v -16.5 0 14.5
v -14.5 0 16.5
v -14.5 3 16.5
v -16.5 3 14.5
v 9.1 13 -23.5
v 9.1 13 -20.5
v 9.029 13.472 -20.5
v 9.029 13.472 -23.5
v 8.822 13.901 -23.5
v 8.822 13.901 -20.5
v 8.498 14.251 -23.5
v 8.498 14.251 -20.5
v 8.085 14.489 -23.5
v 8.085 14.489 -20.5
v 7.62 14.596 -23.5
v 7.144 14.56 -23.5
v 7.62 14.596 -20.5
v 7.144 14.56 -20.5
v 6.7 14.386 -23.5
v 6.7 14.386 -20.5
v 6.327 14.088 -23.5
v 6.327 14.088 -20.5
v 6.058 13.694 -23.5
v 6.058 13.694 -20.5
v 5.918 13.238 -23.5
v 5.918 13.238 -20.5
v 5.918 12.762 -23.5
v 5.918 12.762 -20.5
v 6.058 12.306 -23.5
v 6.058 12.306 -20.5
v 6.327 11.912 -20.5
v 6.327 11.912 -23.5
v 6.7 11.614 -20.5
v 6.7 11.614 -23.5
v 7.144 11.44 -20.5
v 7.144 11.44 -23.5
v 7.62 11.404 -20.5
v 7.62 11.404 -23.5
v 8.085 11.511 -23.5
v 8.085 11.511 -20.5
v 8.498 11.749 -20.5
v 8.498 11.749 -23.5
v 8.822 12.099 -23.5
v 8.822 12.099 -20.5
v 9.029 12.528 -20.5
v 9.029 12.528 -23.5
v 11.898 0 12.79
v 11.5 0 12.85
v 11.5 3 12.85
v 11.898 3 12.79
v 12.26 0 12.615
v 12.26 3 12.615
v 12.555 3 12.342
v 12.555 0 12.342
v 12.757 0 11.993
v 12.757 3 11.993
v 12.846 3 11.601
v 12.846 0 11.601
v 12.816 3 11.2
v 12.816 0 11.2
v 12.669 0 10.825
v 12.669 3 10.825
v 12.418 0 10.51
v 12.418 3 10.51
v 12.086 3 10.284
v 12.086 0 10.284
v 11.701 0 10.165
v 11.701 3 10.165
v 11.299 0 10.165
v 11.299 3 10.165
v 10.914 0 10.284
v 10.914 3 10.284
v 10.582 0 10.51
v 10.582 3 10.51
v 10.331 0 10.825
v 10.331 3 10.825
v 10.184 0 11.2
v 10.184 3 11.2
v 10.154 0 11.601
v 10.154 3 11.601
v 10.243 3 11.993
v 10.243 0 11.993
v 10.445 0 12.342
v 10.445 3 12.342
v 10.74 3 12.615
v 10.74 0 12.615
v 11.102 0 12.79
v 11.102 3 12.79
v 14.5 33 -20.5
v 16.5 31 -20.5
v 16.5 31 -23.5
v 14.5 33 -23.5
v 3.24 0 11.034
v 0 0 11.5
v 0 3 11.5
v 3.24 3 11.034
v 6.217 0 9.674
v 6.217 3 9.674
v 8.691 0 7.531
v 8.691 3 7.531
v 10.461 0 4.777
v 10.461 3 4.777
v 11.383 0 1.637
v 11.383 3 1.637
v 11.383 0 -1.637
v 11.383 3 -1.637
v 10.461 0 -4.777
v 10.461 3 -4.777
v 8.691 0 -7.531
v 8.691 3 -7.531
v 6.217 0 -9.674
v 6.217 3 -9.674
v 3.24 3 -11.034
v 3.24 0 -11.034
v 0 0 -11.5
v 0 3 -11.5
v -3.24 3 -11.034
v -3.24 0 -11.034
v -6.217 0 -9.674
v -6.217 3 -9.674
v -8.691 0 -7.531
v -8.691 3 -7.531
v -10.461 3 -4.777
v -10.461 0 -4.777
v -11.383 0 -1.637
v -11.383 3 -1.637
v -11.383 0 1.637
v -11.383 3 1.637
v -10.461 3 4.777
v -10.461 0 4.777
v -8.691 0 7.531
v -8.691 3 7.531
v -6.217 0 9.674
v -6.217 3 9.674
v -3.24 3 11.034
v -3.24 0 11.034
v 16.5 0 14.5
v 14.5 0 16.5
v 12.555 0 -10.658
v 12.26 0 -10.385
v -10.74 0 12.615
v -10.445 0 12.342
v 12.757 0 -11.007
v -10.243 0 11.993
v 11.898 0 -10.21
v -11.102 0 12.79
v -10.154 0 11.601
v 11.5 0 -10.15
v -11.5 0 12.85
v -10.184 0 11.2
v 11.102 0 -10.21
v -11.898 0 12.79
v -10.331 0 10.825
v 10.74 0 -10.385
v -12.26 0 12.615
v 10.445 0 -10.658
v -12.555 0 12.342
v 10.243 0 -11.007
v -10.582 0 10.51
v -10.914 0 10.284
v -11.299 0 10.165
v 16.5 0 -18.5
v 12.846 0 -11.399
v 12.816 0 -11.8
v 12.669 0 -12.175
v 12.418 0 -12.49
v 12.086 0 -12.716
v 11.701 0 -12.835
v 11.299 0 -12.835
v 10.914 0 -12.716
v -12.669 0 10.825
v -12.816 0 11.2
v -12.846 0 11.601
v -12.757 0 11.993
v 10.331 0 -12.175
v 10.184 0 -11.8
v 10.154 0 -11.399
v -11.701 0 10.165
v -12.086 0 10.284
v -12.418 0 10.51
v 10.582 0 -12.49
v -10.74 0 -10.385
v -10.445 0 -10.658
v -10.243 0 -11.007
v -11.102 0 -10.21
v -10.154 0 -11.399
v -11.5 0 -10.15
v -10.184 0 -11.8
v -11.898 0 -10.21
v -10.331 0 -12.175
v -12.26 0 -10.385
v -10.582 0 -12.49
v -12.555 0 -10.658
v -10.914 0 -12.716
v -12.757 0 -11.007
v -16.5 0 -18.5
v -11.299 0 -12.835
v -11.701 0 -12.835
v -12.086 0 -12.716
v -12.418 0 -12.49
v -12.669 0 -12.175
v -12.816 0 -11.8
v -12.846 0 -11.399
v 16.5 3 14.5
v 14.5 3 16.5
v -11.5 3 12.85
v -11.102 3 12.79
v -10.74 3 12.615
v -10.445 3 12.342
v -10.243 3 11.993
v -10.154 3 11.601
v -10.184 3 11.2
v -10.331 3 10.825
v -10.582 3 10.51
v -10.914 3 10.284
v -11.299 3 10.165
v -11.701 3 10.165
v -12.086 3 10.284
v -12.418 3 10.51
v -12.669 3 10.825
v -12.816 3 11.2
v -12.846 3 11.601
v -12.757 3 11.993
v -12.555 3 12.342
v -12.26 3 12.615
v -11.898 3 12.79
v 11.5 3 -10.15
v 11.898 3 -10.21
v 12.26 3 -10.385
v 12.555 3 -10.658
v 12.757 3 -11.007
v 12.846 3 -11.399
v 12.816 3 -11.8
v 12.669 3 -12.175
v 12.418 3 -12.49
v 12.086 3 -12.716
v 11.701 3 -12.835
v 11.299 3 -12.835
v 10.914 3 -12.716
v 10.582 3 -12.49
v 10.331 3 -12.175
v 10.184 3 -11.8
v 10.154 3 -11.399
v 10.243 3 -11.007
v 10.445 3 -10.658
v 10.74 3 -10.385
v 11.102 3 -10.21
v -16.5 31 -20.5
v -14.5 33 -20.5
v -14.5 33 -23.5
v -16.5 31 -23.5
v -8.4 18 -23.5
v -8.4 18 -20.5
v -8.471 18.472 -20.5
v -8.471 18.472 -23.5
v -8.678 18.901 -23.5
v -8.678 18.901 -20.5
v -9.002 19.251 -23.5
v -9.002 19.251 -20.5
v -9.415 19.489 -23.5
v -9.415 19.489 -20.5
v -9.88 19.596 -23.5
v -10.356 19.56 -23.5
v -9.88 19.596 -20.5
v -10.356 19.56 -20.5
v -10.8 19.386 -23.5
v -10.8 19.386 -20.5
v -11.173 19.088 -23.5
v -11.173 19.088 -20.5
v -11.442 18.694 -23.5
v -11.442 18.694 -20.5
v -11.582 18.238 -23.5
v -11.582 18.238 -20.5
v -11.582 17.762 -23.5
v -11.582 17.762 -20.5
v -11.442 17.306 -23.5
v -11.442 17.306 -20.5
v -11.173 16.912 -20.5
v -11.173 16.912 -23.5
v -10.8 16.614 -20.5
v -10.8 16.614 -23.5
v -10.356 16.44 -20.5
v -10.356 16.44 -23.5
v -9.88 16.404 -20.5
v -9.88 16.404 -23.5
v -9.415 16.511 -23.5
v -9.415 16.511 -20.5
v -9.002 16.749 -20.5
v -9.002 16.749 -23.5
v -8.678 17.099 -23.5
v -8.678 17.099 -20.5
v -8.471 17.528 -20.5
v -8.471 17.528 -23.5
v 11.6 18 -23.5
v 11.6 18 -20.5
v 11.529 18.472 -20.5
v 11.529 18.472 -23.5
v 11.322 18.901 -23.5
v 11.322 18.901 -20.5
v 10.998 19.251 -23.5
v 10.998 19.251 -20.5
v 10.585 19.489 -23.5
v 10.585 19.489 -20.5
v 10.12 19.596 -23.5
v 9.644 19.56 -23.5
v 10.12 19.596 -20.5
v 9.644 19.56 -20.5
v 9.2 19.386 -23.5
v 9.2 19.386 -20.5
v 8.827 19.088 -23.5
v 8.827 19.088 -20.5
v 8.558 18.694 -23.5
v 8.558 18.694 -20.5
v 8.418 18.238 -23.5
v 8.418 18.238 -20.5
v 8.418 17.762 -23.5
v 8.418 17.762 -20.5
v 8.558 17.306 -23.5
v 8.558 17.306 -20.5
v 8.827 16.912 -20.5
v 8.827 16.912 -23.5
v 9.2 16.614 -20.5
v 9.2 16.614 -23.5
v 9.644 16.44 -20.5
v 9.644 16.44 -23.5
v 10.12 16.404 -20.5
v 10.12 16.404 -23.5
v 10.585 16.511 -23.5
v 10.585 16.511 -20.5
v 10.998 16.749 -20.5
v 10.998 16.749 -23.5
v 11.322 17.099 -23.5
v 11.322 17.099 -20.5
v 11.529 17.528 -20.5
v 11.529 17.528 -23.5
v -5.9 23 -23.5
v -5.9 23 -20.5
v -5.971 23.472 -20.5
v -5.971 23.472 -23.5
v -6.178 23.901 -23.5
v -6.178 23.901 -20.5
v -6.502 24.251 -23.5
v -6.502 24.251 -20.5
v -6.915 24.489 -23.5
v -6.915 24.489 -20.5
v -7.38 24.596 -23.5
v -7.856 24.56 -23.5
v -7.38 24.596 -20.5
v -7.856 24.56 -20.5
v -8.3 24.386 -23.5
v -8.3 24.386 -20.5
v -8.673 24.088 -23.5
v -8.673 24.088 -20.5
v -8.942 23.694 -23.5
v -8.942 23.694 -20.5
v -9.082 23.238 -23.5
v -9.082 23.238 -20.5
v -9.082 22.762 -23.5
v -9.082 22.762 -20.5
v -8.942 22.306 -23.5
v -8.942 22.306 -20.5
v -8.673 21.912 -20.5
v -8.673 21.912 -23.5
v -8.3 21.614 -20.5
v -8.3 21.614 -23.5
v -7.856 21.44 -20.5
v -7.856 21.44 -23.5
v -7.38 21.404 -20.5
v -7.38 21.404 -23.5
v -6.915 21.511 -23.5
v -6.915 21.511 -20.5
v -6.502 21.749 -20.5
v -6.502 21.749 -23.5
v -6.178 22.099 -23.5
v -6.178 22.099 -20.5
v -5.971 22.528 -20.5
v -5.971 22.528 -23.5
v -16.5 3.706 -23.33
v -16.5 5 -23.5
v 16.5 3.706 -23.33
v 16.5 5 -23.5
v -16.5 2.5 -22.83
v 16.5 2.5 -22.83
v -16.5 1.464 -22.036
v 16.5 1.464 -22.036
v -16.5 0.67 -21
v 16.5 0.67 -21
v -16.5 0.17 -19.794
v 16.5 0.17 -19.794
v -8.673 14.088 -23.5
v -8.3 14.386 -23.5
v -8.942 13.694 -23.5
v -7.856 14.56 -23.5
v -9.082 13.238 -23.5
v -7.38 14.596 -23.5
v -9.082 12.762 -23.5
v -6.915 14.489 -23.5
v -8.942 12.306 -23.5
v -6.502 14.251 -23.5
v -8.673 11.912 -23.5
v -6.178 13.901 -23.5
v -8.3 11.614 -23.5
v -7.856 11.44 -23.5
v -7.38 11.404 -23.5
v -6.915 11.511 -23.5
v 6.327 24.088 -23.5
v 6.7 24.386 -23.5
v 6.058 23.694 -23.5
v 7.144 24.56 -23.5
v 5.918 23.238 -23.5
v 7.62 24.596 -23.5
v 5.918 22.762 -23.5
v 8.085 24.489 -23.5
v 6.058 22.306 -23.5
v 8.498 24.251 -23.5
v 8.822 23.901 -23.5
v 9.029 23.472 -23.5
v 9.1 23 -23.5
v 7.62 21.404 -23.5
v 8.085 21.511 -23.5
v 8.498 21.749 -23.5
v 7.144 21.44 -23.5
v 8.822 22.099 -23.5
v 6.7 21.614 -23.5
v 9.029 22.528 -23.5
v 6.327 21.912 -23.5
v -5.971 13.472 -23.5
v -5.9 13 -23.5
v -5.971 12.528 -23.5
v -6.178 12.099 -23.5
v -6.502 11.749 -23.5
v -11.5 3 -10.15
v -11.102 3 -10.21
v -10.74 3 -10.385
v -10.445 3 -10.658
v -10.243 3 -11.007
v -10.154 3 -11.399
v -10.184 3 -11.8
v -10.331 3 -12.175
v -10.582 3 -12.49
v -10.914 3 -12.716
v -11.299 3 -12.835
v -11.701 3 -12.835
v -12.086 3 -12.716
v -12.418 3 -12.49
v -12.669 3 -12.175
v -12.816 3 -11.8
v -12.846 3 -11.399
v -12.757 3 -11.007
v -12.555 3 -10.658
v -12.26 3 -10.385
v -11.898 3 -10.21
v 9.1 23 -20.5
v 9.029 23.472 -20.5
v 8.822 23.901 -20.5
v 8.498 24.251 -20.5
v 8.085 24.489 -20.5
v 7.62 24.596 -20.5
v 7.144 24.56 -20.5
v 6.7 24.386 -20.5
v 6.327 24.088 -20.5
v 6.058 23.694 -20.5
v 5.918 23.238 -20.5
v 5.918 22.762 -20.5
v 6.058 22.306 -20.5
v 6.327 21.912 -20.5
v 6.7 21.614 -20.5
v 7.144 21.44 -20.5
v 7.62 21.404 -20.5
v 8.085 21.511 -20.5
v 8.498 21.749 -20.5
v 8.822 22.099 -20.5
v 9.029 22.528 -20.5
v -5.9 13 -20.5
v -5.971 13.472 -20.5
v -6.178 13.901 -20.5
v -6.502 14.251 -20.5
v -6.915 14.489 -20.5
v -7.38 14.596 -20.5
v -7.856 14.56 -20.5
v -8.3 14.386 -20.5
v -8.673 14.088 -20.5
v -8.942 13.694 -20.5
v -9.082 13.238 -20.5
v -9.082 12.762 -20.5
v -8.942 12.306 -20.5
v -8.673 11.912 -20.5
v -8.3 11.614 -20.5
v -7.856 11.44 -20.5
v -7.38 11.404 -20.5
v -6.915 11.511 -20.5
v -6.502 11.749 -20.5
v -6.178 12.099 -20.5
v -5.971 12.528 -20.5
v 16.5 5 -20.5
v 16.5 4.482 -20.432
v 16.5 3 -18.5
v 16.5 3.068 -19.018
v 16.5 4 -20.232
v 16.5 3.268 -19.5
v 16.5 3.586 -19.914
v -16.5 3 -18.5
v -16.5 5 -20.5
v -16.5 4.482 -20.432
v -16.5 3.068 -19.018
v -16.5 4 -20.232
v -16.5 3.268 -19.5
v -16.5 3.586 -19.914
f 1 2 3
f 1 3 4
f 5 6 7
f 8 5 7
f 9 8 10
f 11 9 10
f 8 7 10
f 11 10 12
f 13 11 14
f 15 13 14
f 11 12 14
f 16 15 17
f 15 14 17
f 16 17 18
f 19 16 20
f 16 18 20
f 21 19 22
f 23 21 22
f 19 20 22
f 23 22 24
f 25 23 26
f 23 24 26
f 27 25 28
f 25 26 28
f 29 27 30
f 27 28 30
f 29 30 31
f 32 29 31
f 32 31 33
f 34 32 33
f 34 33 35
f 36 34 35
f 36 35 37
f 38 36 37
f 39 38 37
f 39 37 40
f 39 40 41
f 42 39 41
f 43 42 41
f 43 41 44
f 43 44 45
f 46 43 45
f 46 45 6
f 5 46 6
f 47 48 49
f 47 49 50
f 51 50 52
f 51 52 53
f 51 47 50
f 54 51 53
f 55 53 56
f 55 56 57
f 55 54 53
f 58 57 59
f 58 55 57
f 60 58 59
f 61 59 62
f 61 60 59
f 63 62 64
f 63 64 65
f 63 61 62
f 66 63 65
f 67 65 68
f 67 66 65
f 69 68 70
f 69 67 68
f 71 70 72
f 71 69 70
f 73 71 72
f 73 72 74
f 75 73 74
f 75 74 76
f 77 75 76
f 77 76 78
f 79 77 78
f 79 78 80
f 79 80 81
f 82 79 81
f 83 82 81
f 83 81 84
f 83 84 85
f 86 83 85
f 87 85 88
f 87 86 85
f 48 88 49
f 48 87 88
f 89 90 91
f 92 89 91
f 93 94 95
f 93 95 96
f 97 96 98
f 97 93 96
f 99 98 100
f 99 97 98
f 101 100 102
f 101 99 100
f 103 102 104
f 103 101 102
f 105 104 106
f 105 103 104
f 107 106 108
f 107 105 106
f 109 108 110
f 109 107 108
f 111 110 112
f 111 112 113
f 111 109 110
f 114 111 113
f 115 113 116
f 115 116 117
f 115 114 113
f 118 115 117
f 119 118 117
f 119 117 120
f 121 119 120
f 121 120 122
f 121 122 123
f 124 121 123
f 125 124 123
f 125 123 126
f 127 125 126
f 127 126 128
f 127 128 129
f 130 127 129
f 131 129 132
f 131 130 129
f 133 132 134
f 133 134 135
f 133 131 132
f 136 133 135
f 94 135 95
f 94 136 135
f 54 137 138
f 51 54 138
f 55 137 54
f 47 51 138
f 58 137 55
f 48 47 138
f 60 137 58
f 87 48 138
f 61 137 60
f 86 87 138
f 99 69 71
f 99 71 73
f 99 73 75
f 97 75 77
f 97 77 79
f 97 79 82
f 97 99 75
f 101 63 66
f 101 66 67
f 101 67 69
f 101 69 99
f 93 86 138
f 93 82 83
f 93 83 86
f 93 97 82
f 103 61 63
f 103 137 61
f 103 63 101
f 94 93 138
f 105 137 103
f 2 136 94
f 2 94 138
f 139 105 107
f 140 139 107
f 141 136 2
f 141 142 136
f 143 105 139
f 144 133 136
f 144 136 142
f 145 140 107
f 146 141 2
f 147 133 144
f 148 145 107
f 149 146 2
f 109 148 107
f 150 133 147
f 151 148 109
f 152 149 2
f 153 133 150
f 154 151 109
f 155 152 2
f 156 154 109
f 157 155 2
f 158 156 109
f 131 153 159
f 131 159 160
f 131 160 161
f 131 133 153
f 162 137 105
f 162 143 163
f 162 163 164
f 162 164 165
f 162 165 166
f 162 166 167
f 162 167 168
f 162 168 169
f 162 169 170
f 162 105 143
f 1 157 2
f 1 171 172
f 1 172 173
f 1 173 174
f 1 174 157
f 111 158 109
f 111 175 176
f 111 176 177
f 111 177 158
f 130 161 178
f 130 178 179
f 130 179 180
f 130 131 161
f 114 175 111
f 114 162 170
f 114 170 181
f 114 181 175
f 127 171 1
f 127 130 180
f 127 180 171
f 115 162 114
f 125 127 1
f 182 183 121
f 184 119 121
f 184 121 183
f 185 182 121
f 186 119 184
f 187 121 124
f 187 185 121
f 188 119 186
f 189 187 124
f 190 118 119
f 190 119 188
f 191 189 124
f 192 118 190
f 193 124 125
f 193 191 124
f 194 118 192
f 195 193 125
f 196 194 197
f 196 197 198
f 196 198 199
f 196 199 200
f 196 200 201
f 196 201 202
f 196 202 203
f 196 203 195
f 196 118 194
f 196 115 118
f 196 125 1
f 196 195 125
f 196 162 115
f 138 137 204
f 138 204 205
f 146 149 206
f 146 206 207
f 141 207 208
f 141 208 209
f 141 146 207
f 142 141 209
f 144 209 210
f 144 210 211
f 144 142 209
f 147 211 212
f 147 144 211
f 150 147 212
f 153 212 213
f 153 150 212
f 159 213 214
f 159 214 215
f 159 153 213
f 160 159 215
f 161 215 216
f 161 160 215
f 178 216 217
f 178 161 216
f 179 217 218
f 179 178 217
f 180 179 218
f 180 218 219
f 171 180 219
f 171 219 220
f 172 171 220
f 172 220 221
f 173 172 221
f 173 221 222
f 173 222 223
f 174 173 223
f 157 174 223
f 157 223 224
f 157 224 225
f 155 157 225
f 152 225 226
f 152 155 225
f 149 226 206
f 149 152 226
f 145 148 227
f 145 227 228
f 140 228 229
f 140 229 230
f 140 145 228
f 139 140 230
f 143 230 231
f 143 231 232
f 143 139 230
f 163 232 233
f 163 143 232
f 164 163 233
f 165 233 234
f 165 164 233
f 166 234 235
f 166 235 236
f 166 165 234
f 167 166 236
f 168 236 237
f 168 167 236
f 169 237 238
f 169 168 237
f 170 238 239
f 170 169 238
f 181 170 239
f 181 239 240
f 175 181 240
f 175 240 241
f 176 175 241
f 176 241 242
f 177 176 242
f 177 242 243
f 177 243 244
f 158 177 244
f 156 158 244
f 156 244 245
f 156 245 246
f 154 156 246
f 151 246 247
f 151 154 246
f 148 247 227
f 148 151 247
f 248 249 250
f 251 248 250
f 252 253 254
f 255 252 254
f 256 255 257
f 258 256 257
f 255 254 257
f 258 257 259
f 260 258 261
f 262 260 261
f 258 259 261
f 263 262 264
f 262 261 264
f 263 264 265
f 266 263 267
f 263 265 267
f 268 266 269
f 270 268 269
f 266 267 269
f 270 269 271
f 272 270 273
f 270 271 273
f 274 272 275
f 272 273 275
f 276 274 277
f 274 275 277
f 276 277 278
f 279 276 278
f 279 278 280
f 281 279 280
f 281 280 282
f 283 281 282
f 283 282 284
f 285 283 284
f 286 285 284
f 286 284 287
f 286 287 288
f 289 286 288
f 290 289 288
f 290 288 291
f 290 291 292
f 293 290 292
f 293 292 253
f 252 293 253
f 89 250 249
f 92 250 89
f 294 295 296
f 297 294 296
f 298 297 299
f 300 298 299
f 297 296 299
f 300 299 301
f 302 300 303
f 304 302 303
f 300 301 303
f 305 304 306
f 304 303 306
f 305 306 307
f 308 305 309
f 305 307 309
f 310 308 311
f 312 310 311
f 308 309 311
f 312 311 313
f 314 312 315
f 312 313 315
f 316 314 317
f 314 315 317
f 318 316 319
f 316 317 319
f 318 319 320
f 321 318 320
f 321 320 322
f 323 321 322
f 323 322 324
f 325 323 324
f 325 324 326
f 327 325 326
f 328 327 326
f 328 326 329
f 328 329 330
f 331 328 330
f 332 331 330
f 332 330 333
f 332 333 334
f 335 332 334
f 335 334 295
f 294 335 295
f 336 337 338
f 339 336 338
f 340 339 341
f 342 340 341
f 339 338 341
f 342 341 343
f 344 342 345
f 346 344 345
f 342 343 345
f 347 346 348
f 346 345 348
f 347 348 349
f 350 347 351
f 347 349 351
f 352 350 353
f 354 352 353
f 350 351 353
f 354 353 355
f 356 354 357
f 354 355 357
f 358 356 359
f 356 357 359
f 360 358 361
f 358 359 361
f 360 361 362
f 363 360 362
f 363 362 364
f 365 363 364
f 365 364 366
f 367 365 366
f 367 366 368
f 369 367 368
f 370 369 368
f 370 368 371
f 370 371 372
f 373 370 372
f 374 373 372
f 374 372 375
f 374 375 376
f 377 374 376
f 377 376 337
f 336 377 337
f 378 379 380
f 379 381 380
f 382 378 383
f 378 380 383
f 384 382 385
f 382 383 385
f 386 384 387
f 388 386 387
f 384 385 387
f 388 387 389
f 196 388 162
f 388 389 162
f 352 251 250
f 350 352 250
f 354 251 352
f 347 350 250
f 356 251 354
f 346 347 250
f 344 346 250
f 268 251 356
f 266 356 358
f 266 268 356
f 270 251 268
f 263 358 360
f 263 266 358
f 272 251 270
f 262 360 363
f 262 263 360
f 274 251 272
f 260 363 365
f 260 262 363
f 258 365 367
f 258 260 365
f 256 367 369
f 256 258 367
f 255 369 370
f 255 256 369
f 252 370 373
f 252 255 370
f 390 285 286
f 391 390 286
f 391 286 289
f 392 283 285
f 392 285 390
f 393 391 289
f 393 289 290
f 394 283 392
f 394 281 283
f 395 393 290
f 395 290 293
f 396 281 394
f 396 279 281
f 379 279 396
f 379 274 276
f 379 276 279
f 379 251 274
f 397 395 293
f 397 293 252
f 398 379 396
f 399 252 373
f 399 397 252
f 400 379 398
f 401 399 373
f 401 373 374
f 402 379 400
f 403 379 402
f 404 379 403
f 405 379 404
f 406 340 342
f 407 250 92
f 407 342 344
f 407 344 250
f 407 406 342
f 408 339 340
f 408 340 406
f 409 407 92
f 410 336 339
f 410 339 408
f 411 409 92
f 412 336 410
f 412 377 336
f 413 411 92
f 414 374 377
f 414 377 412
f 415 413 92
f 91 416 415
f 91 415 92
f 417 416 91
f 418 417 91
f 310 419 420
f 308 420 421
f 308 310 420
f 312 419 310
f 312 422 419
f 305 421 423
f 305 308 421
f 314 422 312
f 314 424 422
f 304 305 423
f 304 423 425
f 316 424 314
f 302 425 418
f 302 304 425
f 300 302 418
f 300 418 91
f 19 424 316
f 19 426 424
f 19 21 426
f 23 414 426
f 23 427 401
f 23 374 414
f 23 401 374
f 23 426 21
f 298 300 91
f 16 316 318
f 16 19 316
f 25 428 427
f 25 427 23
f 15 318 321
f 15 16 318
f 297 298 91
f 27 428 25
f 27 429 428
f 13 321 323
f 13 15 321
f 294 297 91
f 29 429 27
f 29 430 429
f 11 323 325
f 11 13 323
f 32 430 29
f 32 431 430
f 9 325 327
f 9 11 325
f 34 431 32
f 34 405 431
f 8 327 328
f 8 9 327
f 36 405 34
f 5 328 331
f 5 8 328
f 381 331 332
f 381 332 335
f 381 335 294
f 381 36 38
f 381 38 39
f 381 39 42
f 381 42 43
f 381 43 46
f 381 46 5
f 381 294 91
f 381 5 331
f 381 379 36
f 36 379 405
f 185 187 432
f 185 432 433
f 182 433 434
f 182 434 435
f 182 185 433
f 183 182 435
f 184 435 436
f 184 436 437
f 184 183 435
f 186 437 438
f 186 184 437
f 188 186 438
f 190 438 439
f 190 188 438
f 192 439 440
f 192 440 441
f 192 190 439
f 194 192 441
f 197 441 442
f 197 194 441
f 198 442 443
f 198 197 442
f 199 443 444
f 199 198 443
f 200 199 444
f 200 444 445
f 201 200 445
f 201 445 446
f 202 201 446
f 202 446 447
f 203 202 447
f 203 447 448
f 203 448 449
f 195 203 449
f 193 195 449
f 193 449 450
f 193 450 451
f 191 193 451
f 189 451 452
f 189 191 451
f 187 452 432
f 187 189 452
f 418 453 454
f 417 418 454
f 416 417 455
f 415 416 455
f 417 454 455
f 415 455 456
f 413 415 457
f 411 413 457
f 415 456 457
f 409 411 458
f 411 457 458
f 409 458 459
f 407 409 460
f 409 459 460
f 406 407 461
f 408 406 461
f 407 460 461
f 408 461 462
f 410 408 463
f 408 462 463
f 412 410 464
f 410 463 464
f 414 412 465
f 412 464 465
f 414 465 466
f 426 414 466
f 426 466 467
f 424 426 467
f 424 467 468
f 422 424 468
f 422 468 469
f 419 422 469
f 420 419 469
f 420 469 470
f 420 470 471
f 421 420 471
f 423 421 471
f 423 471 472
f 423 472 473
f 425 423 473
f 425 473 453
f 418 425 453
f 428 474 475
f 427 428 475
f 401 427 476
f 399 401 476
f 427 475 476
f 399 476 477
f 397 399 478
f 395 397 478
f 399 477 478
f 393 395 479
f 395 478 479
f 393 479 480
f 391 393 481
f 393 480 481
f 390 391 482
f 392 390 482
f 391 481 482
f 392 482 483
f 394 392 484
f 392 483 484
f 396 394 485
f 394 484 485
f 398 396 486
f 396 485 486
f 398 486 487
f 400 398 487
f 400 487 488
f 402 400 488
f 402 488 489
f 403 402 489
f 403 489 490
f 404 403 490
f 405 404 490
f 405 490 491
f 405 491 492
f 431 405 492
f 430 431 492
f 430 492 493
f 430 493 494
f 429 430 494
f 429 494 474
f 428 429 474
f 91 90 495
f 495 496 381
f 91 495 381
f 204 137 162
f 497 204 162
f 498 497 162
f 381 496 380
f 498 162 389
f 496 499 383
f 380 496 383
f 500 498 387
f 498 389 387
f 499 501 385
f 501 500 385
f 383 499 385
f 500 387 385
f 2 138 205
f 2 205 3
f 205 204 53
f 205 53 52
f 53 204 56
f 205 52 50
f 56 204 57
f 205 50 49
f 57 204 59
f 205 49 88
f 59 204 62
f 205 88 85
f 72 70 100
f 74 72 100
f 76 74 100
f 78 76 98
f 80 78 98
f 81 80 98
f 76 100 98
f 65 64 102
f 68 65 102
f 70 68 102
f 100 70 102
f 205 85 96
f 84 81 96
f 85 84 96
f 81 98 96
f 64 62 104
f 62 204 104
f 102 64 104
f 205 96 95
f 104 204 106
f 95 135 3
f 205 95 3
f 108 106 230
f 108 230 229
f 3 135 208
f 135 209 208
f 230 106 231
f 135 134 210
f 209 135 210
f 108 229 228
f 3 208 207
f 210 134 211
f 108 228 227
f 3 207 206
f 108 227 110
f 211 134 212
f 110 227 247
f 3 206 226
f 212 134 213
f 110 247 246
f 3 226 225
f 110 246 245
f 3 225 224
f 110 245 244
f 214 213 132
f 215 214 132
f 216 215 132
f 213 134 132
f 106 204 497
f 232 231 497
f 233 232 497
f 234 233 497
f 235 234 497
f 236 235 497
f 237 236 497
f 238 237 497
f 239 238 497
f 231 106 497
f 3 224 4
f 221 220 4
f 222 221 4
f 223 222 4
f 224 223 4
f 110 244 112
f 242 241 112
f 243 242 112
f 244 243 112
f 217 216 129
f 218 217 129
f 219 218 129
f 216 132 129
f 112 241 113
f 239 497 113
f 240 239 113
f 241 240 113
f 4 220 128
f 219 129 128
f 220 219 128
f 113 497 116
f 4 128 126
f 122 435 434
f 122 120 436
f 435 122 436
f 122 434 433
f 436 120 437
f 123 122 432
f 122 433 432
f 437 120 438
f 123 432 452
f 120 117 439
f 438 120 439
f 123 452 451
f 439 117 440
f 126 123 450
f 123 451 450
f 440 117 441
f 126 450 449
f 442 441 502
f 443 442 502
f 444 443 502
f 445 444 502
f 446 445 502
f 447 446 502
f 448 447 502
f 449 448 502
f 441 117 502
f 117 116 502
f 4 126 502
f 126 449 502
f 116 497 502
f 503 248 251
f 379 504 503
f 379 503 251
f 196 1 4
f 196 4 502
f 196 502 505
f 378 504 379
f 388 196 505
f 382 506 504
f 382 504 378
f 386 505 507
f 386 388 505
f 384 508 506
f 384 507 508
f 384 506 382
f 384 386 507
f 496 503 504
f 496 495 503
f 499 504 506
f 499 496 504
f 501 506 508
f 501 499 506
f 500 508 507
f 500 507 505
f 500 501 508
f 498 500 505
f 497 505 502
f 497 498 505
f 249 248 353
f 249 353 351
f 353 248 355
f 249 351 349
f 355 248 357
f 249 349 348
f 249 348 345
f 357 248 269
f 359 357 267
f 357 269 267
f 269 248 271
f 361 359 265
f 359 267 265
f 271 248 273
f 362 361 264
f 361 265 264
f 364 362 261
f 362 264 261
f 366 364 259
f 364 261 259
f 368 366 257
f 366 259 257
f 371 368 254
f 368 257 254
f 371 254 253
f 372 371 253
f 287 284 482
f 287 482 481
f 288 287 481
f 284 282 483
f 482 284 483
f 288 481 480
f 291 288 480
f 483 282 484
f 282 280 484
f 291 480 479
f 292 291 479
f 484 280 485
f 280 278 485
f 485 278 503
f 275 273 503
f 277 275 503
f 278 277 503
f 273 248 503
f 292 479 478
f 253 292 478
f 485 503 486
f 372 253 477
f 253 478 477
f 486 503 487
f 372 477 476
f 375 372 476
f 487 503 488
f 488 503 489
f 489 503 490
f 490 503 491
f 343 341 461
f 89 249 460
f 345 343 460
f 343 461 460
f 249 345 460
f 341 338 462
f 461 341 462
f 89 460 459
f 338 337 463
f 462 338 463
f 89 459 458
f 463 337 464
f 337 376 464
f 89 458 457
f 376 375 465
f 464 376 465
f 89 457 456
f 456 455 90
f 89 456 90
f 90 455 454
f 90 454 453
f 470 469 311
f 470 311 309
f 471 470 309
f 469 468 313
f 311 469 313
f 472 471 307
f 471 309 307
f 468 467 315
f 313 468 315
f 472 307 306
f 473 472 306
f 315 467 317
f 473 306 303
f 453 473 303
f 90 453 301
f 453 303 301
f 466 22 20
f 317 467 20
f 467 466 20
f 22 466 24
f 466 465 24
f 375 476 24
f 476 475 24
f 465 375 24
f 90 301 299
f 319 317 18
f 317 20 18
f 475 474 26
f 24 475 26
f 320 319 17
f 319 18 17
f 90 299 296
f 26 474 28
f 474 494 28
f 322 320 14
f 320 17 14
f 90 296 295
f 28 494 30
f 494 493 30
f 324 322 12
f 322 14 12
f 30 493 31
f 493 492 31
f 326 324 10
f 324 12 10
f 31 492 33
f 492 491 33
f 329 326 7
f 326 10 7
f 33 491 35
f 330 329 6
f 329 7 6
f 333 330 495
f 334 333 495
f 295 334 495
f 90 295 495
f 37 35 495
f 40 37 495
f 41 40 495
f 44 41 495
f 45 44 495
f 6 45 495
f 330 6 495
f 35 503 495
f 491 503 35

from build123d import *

# Parameters (mm, degrees)
SKETCH_5_R          = 11.5
SKETCH_5_R_2        = 1.35
EXTRUDE_3_DEPTH     = 3
SKETCH_8_W          = 33
SKETCH_8_H          = 3
EXTRUDE_4_DEPTH     = 30
SKETCH_10_R         = 1.6
CUT_EXTRUDE_4_DEPTH = 5
FILLET_1_R          = 2
FILLET_2_R          = 5
CHAMFER_1_SIZE      = 2


with BuildPart() as part:
    # 草图5 → 凸台-拉伸3 (new body)
    with BuildSketch(Plane(origin=(0, 0, 0), x_dir=(1, 0, 0), z_dir=(0, 1, 0))):
        Polygon((16.5, 23.5), (16.5, -14.5), (14.5, -16.5), (-14.5, -16.5), (-16.5, -14.5), (-16.5, 23.5), align=None)
        with Locations(Location((0, 0, 0), (0, 0, 270))):
            Circle(SKETCH_5_R, mode=Mode.SUBTRACT)
        with Locations(Location((-11.5, -11.5, 0), (0, 0, 270))):
            Circle(SKETCH_5_R_2, mode=Mode.SUBTRACT)
        with Locations(Location((-11.5, 11.5, 0), (0, 0, 270))):
            Circle(SKETCH_5_R_2, mode=Mode.SUBTRACT)
        with Locations(Location((11.5, 11.5, 0), (0, 0, 270))):
            Circle(SKETCH_5_R_2, mode=Mode.SUBTRACT)
        with Locations(Location((11.5, -11.5, 0), (0, 0, 270))):
            Circle(SKETCH_5_R_2, mode=Mode.SUBTRACT)
    extrude(amount=EXTRUDE_3_DEPTH)

    # 草图8 → 凸台-拉伸4 (add)
    with BuildSketch(Plane(origin=(0, 3, 0), x_dir=(1, 0, 0), z_dir=(0, 1, 0))):
        with Locations((0, 22)):
            Rectangle(SKETCH_8_W, SKETCH_8_H)
    extrude(amount=EXTRUDE_4_DEPTH)

    # 草图10 → 切除-拉伸4 (cut)
    with BuildSketch(Plane.XY.offset(-20.5)):
        with Locations((-7.5, 23)):
            Circle(SKETCH_10_R)
        with Locations((7.5, 23)):
            Circle(SKETCH_10_R)
        with Locations((7.5, 13)):
            Circle(SKETCH_10_R)
        with Locations((-7.5, 13)):
            Circle(SKETCH_10_R)
        with Locations((-10, 18)):
            Circle(SKETCH_10_R)
        with Locations((10, 18)):
            Circle(SKETCH_10_R)
    extrude(amount=-CUT_EXTRUDE_4_DEPTH, mode=Mode.SUBTRACT)

    # 圆角1
    fillet_1_edges = [part.edges().sort_by_distance(p)[0] for p in [
        (0, 3, -20.5),
    ]]
    fillet(fillet_1_edges, radius=FILLET_1_R)

    # 圆角2
    fillet_2_edges = [part.edges().sort_by_distance(p)[0] for p in [
        (0, 0, -23.5),
    ]]
    fillet(fillet_2_edges, radius=FILLET_2_R)

    # 倒角1
    chamfer_1_edges = [part.edges().sort_by_distance(p)[0] for p in [
        (-16.5, 33, -22),
        (16.5, 33, -22),
    ]]
    chamfer(chamfer_1_edges, length=CHAMFER_1_SIZE)


solid = part.part
